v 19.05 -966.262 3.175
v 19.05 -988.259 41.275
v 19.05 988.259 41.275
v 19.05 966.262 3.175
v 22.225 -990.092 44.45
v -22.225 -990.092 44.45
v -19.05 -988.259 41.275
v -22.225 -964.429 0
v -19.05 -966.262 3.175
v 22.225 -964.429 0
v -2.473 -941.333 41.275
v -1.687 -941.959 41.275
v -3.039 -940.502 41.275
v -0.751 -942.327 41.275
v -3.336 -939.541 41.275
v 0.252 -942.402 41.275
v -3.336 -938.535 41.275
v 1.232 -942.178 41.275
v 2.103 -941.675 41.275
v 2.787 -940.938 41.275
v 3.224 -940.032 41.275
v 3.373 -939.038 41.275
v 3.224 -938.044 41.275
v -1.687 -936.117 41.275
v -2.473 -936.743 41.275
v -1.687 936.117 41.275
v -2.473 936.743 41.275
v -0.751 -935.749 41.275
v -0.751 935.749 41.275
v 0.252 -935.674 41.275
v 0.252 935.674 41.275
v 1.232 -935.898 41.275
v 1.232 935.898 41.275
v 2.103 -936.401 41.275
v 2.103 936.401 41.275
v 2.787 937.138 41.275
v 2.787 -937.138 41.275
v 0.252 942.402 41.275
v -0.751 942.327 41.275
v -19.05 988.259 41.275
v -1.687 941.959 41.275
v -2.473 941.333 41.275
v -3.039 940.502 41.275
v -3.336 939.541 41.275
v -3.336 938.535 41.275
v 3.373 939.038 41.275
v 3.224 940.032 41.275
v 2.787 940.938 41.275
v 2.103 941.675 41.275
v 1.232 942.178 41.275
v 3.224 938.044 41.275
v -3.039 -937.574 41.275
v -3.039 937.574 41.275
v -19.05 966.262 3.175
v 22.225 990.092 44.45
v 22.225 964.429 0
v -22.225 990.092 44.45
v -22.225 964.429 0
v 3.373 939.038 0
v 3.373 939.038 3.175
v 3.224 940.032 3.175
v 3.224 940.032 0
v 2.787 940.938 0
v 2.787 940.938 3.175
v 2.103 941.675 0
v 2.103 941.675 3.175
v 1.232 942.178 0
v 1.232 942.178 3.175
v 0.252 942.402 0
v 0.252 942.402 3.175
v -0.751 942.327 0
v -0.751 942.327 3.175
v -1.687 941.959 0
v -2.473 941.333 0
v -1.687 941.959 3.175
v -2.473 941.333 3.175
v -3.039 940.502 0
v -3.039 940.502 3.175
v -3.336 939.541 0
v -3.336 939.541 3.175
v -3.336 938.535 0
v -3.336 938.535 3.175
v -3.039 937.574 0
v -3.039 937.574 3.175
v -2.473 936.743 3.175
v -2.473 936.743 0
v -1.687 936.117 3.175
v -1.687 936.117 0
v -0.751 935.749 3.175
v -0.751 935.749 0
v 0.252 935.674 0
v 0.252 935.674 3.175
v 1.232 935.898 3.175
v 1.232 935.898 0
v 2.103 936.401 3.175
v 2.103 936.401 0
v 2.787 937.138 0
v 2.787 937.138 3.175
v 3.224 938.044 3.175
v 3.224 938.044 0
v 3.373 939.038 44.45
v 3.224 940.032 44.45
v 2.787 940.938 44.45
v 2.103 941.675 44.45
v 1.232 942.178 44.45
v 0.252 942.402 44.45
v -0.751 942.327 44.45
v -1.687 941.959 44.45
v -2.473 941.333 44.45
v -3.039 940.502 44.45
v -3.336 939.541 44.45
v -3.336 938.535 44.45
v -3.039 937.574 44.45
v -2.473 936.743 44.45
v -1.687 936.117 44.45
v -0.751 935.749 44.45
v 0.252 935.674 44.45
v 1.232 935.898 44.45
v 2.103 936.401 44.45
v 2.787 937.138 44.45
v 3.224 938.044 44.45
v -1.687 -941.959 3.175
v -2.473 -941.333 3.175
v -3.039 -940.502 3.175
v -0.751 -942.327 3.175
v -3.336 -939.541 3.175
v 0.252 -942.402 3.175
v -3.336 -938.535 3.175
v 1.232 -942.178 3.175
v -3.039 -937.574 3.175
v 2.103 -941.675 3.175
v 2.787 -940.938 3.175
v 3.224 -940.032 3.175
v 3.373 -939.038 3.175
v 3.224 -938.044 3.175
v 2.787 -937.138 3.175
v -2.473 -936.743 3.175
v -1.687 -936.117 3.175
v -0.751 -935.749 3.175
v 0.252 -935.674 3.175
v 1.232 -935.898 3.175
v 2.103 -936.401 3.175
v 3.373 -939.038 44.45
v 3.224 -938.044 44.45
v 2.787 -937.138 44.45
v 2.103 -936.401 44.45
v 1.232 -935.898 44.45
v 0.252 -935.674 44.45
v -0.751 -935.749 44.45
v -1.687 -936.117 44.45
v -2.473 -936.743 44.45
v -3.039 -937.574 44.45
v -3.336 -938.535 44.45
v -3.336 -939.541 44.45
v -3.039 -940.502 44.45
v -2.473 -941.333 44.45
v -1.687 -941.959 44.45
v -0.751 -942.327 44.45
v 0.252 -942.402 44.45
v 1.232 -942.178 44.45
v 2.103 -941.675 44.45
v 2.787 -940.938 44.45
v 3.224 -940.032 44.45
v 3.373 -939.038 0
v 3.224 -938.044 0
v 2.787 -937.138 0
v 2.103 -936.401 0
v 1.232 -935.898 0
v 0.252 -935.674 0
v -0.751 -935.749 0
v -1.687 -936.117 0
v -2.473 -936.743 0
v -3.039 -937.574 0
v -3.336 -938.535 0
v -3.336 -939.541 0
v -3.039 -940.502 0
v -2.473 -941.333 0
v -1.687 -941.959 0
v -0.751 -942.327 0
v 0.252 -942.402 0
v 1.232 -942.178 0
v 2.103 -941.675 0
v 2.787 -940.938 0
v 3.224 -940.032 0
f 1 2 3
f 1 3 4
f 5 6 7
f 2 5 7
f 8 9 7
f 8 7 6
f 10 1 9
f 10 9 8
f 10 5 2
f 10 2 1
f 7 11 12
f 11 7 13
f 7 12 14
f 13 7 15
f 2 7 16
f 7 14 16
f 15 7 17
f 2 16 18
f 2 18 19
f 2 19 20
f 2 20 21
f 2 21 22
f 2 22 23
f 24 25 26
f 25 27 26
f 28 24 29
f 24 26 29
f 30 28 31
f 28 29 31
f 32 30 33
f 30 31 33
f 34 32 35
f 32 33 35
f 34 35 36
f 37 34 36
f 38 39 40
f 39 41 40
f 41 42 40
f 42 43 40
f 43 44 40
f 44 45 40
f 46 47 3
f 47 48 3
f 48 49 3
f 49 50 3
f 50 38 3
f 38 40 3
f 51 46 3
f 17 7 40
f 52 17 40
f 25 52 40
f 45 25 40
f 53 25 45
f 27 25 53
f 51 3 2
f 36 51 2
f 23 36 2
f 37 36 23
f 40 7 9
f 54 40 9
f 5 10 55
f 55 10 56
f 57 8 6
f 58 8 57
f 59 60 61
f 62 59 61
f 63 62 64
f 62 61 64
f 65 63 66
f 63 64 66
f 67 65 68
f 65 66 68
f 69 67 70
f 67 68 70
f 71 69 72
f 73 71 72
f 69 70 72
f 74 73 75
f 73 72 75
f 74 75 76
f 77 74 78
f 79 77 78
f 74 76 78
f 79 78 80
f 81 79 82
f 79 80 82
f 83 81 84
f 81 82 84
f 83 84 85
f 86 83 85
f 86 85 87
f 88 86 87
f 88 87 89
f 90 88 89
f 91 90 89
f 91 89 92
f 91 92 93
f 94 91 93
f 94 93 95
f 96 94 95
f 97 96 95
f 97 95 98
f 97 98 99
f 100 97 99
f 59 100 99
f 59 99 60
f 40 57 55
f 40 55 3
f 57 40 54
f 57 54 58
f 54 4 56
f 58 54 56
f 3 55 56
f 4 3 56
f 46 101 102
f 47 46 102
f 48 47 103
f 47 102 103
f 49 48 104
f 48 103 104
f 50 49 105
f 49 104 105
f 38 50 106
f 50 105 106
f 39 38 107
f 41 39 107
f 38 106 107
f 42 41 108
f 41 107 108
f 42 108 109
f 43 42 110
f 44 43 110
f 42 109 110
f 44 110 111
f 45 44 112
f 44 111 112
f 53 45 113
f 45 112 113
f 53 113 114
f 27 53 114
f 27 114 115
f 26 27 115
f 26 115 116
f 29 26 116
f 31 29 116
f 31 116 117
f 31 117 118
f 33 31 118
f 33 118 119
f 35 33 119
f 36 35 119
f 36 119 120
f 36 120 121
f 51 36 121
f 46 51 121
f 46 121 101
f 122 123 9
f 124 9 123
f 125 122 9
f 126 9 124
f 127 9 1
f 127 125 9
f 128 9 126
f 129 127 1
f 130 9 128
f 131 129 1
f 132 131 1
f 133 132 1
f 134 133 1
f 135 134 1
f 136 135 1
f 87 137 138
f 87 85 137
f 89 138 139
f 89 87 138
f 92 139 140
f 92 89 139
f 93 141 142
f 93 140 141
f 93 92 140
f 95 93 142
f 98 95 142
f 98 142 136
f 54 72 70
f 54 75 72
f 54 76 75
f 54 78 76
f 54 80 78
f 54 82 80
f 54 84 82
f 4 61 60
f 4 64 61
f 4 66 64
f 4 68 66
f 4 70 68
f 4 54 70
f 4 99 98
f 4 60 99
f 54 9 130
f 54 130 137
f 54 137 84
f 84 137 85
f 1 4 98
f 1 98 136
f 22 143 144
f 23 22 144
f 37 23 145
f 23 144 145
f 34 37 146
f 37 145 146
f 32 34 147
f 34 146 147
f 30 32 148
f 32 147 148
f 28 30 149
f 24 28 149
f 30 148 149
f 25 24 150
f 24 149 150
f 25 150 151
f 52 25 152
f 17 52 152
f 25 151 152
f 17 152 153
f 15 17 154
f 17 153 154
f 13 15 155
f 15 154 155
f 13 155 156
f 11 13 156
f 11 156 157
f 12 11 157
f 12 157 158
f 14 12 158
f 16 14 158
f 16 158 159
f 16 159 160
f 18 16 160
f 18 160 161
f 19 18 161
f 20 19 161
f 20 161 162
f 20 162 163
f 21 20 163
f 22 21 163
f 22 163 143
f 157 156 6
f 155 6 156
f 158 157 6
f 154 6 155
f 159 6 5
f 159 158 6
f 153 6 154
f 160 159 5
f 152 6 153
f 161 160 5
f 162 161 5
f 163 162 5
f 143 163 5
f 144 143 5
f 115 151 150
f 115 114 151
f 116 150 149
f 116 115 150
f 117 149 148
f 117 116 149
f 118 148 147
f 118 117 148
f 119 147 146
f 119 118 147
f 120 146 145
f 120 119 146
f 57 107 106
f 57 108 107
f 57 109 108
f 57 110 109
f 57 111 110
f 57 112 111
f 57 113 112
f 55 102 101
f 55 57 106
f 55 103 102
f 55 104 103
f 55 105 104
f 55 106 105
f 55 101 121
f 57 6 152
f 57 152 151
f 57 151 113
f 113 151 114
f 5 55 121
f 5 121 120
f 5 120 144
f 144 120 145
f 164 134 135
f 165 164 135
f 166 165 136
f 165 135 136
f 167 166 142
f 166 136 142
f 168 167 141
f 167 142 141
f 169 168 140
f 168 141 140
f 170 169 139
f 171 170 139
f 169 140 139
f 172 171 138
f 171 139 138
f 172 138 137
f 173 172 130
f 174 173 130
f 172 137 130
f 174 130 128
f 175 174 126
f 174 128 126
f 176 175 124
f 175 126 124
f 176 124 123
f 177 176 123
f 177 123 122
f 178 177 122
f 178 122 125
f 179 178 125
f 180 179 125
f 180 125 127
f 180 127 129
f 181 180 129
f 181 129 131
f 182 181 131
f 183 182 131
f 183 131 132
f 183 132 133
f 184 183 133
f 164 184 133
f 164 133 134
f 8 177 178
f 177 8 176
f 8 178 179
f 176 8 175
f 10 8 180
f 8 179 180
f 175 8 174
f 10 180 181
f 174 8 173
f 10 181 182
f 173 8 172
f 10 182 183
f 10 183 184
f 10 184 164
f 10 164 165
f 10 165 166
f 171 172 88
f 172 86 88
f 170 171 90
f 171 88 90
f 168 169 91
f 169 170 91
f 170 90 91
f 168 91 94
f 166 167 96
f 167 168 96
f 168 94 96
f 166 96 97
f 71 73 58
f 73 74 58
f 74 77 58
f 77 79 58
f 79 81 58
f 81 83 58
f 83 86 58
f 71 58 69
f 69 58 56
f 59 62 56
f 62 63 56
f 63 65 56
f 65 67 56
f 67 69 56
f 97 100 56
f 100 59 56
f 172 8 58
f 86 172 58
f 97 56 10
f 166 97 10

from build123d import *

# Parameters (mm, degrees)
SKETCH1_W           = 44.45
SKETCH1_H           = 1980.184
BOSS_EXTRUDE1_DEPTH = 44.45
SKETCH2_W           = 38.1
SKETCH2_H           = 38.1
CUT_EXTRUDE1_DEPTH  = 1981.807518913
CUT_EXTRUDE2_DEPTH  = 993.085567612
SKETCH13_R          = 3.3734375
CUT_EXTRUDE7_DEPTH  = 992.338449567


with BuildPart() as part:
    # Sketch1 → Boss-Extrude1 (new body)
    with BuildSketch(Plane.XY):
        Rectangle(SKETCH1_W, SKETCH1_H)
    extrude(amount=BOSS_EXTRUDE1_DEPTH)

    # Sketch2 → Cut-Extrude1 (cut, through all)
    with BuildSketch(Plane(origin=(0, 990.092, 0), x_dir=(1, 0, 0), z_dir=(0, 1, 0))):
        with Locations((0, -22.225)):
            Rectangle(SKETCH2_W, SKETCH2_H)
    extrude(amount=-CUT_EXTRUDE1_DEPTH, mode=Mode.SUBTRACT)

    # Sketch3 → Cut-Extrude2 (cut, through all)
    with BuildSketch(Plane(origin=(22.225, 0, 0), x_dir=(0, 0, -1), z_dir=(1, 0, 0))):
        Polygon((-44.45, 990.092), (0, 964.428780535), (0, 990.092), align=None)
        Polygon((-44.45, -990.092), (0, -964.428780535), (0, -990.092), align=None)
    extrude(amount=-CUT_EXTRUDE2_DEPTH, mode=Mode.SUBTRACT)

    # Sketch13 → Cut-Extrude7 (cut, through all)
    with BuildSketch(Plane.XY.offset(44.45)):
        with Locations((0, 939.038)):
            Circle(SKETCH13_R)
        with Locations((0, -939.038)):
            Circle(SKETCH13_R)
    extrude(amount=-CUT_EXTRUDE7_DEPTH, mode=Mode.SUBTRACT)


solid = part.part
